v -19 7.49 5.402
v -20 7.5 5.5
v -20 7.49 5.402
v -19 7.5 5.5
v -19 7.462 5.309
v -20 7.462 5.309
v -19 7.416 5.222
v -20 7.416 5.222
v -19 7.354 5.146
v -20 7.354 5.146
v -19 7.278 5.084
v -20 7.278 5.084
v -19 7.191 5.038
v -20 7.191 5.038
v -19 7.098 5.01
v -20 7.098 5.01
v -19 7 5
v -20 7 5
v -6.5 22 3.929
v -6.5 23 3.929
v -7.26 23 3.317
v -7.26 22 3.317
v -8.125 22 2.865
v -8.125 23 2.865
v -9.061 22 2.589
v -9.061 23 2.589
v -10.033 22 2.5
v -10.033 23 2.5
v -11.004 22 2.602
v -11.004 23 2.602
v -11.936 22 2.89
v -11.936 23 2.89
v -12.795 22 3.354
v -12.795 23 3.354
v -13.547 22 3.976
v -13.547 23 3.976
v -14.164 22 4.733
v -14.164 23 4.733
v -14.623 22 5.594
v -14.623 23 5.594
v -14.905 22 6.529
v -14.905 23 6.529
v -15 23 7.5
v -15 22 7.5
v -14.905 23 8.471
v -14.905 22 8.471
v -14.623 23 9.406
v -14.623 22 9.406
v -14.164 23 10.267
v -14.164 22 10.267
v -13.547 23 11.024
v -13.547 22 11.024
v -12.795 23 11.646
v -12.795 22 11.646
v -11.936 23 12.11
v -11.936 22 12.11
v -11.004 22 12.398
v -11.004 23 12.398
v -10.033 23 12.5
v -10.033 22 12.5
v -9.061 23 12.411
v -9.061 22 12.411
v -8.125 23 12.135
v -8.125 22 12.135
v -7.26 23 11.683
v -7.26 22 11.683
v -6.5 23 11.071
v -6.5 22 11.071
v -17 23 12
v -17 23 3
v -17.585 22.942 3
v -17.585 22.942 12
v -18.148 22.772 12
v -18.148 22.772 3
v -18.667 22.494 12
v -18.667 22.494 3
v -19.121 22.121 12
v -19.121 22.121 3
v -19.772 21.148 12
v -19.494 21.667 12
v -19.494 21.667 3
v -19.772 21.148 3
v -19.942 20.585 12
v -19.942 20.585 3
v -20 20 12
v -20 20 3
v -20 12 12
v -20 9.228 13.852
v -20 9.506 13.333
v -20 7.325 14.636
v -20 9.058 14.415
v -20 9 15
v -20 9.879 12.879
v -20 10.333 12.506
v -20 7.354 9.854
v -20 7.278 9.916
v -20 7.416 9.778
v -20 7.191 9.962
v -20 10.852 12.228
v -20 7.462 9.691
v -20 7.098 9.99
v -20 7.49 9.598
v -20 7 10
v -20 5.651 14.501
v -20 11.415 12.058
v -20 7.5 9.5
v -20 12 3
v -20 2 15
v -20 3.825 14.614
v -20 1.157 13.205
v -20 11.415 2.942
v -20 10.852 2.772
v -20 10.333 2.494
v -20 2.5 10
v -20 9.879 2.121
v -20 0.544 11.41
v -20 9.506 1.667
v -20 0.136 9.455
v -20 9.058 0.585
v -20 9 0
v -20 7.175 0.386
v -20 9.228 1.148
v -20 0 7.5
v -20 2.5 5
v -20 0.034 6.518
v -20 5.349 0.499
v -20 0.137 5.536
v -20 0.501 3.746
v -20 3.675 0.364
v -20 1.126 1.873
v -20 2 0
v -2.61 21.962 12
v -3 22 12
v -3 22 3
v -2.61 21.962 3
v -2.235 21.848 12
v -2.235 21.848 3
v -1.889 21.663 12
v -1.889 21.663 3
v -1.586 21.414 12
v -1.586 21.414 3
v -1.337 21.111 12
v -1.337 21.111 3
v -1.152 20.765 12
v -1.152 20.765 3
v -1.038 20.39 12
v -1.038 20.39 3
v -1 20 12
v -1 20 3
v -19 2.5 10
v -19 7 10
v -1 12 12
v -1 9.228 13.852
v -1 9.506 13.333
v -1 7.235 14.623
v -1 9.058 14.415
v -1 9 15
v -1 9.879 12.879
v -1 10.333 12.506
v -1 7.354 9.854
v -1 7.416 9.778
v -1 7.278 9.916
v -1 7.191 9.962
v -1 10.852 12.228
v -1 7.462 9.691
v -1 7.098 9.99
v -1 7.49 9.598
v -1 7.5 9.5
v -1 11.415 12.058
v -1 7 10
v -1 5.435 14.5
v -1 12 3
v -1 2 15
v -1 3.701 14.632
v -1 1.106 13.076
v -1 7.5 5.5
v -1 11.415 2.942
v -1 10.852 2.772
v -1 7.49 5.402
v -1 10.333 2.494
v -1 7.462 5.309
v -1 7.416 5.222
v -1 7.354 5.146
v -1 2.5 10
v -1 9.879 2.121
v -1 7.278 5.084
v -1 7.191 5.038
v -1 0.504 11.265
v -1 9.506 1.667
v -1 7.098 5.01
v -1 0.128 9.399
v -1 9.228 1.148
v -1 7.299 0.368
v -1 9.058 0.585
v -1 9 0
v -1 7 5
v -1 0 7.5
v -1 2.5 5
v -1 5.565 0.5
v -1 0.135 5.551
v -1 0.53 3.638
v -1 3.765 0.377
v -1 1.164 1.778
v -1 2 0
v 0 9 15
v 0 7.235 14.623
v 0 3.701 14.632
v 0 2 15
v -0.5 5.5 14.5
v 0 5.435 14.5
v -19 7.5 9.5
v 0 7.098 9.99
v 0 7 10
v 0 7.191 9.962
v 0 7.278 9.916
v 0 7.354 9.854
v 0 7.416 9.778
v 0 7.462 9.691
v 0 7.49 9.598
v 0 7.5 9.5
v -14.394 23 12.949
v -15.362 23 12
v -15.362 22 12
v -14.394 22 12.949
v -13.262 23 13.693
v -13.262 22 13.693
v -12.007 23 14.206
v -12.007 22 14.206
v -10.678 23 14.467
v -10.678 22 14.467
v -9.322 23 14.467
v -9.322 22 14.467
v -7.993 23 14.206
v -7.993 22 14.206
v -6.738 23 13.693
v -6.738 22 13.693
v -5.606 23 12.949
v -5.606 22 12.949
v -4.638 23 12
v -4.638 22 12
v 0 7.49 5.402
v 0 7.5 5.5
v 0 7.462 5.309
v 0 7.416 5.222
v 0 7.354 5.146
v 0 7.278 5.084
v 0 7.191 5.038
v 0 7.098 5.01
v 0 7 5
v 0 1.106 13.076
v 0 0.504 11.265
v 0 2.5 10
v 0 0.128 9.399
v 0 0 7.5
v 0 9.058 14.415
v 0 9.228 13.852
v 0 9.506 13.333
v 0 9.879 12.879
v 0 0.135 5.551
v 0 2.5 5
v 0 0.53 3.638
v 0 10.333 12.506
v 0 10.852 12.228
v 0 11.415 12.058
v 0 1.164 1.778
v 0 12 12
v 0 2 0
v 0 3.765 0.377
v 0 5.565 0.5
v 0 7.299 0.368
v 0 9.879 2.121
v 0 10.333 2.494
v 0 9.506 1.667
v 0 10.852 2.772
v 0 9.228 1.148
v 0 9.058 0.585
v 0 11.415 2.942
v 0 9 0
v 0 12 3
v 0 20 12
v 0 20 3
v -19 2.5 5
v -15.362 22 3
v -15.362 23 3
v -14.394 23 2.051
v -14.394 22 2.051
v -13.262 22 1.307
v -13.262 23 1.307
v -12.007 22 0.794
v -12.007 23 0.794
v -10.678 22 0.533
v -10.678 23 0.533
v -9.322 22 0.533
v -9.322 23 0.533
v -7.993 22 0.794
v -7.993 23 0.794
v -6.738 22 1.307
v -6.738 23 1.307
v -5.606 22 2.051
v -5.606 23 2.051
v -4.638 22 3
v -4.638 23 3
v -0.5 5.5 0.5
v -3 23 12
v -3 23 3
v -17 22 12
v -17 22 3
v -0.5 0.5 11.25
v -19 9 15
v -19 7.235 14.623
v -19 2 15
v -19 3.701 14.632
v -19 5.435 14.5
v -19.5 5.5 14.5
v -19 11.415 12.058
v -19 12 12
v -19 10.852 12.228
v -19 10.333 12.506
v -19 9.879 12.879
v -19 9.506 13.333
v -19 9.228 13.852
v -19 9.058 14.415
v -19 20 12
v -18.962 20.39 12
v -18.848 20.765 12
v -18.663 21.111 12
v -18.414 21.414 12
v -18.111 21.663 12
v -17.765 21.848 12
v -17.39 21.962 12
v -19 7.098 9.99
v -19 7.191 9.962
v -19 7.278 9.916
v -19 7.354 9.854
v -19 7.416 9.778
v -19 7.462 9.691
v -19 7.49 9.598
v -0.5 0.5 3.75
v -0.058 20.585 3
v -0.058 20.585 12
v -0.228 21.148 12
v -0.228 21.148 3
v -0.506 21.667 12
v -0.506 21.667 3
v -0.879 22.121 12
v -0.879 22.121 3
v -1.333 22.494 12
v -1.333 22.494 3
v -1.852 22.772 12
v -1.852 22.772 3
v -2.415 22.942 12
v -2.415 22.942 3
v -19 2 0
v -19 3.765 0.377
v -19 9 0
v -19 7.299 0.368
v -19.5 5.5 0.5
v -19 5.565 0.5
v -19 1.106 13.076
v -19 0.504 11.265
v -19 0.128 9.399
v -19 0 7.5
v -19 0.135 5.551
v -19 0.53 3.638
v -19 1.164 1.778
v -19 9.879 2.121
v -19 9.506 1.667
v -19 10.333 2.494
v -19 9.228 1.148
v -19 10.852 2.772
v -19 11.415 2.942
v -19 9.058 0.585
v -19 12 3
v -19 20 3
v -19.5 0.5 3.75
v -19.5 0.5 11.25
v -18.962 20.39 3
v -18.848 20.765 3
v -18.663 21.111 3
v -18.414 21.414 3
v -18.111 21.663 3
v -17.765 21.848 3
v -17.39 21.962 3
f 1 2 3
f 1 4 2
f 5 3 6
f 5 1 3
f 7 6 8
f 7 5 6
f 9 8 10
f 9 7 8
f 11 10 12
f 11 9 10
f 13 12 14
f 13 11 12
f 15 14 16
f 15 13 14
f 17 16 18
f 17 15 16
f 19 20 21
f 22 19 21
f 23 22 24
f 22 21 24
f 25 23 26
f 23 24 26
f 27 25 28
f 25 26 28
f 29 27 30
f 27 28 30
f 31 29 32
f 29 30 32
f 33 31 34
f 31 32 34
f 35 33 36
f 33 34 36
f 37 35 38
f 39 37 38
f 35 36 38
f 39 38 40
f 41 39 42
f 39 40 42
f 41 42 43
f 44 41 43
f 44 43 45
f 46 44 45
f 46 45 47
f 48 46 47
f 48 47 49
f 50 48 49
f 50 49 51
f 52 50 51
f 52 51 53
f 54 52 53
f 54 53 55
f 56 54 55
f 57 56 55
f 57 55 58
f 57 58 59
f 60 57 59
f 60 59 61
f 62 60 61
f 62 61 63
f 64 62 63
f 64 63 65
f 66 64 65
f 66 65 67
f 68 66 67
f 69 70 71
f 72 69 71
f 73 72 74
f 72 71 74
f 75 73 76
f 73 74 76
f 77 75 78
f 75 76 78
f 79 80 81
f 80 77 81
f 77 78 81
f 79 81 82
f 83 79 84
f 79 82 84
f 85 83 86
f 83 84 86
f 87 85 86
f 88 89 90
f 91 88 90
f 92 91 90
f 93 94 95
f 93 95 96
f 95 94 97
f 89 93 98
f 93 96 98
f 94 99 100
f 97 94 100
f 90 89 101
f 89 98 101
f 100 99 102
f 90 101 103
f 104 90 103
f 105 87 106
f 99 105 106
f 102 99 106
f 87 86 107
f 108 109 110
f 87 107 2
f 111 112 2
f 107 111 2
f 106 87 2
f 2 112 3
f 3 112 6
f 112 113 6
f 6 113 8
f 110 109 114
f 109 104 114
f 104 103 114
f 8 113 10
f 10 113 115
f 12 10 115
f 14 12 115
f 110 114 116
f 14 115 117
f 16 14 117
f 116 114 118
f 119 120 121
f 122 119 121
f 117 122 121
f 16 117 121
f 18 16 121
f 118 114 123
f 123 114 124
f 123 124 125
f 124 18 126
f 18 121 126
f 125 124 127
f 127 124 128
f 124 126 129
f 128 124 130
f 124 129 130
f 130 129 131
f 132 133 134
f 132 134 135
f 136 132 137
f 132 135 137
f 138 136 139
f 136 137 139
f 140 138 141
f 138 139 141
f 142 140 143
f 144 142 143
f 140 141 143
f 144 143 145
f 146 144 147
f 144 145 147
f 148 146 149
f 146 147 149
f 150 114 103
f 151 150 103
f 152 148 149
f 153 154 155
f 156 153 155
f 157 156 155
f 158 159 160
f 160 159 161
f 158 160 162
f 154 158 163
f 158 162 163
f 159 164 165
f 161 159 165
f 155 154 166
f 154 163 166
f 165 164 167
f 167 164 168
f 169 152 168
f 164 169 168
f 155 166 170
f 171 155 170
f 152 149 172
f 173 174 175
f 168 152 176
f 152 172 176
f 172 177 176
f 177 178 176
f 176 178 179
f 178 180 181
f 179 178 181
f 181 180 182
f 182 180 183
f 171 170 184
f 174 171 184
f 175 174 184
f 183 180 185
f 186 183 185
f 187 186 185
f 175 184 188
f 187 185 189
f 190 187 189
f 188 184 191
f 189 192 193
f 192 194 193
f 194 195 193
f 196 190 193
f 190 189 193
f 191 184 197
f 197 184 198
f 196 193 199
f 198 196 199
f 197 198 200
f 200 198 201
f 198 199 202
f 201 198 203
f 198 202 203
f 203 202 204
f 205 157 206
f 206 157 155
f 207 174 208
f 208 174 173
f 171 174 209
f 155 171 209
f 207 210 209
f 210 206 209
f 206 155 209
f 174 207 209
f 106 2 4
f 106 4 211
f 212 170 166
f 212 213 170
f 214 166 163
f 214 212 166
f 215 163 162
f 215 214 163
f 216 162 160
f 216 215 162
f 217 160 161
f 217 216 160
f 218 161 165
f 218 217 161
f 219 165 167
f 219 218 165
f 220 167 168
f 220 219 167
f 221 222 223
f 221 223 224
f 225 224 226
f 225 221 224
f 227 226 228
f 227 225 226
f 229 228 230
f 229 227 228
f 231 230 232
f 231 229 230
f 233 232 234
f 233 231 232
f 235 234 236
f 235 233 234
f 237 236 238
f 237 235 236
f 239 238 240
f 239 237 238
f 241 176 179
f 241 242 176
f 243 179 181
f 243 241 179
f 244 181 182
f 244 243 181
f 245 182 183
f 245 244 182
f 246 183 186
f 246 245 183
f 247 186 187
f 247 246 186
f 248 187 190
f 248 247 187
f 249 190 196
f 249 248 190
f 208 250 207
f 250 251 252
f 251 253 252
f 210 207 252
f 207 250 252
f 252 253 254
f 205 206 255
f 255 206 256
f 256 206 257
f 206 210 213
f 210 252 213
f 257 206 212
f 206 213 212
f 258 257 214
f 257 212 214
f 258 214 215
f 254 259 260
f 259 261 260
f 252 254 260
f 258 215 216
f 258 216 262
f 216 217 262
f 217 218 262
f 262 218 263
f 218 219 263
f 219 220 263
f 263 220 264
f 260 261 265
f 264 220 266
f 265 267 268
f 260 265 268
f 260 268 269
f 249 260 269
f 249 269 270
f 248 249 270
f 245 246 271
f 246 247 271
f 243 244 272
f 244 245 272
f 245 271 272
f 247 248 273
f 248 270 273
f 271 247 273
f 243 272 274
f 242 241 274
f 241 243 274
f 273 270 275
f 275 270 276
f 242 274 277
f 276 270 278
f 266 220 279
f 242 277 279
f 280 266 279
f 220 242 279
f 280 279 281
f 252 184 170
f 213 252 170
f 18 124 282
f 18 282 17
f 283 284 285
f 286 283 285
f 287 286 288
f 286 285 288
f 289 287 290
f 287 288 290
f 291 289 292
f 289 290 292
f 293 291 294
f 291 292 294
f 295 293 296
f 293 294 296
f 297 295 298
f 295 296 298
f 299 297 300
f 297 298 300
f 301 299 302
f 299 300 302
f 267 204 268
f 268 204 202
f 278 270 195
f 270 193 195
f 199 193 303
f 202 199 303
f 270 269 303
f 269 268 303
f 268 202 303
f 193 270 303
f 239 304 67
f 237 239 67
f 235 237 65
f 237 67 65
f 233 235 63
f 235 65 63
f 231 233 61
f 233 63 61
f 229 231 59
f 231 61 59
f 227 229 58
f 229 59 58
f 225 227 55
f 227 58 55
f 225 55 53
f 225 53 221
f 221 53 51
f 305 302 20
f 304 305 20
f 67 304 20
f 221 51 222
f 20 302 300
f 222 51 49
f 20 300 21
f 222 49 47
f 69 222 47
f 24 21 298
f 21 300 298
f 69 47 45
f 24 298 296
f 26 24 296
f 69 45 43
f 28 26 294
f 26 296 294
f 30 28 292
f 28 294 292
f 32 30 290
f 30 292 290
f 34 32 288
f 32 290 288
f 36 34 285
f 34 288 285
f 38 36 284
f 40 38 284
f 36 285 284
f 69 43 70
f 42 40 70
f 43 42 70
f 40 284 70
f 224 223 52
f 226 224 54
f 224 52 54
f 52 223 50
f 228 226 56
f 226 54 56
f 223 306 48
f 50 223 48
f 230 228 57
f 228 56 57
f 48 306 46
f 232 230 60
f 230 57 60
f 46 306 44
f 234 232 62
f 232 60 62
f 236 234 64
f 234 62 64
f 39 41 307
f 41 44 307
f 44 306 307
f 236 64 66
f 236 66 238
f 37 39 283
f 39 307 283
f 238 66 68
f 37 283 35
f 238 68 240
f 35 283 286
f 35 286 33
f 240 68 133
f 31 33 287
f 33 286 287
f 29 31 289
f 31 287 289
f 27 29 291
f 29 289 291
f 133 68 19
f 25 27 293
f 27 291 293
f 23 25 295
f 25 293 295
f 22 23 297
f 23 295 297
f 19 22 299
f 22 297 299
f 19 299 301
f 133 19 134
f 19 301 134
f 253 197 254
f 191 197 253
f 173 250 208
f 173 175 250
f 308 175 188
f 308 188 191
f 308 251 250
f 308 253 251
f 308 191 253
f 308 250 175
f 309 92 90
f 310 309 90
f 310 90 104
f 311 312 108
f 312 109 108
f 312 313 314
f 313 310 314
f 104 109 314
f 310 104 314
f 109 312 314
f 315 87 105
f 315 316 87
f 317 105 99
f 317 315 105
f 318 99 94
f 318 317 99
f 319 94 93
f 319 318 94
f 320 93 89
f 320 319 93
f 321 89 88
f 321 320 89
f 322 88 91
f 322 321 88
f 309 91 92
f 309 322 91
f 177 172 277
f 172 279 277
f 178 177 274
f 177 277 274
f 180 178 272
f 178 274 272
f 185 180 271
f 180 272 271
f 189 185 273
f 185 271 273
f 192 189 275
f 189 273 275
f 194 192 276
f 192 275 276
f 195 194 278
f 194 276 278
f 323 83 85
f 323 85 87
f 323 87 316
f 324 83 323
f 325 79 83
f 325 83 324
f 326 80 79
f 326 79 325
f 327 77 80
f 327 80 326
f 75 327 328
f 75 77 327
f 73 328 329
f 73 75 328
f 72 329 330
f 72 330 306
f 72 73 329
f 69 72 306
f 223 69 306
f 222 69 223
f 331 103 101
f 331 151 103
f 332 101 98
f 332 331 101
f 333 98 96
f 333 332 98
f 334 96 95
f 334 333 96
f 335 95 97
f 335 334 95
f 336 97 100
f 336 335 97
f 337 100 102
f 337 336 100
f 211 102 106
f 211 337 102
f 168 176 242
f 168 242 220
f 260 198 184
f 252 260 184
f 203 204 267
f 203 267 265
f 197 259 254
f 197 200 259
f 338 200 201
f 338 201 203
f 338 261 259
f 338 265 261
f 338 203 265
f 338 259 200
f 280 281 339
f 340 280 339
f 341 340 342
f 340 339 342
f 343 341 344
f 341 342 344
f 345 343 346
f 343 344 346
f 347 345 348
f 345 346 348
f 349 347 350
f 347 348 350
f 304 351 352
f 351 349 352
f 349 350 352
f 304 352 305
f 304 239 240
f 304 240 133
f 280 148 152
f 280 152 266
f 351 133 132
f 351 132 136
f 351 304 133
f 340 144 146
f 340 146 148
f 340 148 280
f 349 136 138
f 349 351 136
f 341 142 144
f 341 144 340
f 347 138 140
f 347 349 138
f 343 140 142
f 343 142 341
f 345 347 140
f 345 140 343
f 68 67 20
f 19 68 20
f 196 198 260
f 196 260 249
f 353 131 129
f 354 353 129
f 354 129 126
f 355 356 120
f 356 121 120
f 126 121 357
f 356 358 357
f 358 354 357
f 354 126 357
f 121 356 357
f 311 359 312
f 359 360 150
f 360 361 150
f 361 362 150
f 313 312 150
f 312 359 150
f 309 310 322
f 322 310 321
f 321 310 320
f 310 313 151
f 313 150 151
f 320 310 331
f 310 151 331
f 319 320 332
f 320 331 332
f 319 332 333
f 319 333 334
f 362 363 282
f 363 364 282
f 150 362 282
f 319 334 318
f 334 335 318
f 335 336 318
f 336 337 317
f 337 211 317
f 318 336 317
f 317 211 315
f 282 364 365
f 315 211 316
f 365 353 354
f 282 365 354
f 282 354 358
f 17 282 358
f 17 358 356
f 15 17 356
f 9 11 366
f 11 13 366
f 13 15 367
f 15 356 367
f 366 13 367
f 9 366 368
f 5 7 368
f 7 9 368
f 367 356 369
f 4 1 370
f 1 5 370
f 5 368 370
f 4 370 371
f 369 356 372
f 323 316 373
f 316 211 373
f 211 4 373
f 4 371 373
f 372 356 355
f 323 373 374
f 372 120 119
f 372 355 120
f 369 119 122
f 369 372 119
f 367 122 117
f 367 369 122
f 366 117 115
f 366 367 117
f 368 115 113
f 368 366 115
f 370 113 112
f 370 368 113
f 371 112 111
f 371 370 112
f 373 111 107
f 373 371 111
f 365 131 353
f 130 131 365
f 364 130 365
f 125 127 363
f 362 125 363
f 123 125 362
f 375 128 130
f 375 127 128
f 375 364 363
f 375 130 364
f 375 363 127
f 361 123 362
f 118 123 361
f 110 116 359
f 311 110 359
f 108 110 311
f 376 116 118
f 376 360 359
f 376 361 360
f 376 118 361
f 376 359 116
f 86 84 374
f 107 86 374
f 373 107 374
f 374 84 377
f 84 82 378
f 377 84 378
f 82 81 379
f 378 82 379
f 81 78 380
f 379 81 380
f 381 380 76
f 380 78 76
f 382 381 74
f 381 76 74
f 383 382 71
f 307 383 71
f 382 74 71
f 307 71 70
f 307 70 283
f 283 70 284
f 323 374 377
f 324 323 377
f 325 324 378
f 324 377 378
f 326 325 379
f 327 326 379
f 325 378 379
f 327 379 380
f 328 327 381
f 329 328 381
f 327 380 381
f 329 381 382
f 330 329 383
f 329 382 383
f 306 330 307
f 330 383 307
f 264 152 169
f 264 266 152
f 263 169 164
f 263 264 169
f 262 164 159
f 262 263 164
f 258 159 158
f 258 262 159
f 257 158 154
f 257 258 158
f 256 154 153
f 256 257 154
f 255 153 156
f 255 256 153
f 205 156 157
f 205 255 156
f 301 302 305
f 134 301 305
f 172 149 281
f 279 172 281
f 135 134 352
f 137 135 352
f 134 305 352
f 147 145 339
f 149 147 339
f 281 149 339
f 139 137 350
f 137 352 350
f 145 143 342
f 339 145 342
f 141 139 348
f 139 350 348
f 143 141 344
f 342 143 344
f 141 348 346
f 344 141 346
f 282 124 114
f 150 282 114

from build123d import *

# Parameters (mm, degrees)
BOSS_EXTRUDE1_DEPTH = 15
CUT_EXTRUDE2_DEPTH  = 34.970575503
CUT_EXTRUDE3_DEPTH  = 14
CUT_EXTRUDE4_DEPTH  = 34.970575503
CUT_EXTRUDE5_DEPTH  = 34.970575606
FILLET1_R           = 3
FILLET2_R           = 3
SKETCH7_W           = 5
SKETCH7_H           = 5
CUT_EXTRUDE6_DEPTH  = 34.970575606
FILLET3_R           = 0.5


with BuildPart() as part:
    # Sketch1 → Boss-Extrude1 (new body)
    with BuildSketch(Plane.XY):
        with BuildLine():
            Line((-19, 0), (-19, 20))
            ThreePointArc((-19, 20), (-18.414213562, 21.414213562), (-17, 22))
            Line((-17, 22), (-3, 22))
            ThreePointArc((-3, 22), (-1.585786438, 21.414213562), (-1, 20))
            Line((-1, 20), (-1, 0))
            Line((-1, 0), (0, 0))
            Line((0, 0), (0, 20))
            ThreePointArc((0, 20), (-0.878679656, 22.121320344), (-3, 23))
            Line((-3, 23), (-17, 23))
            ThreePointArc((-17, 23), (-19.121320344, 22.121320344), (-20, 20))
            Line((-20, 20), (-20, 0))
            Line((-20, 0), (-19, 0))
        make_face()
    extrude(amount=BOSS_EXTRUDE1_DEPTH)

    # Sketch2 → Cut-Extrude2 (cut, through all)
    with BuildSketch(Plane(origin=(0, 23, 0), x_dir=(1, 0, 0), z_dir=(0, 1, 0))):
        with BuildLine():
            Line((-6.5, -11.070714214), (-6.5, -3.929285786))
            ThreePointArc((-6.5, -3.929285786), (-15, -7.5), (-6.5, -11.070714214))
        make_face()
    extrude(amount=-CUT_EXTRUDE2_DEPTH, mode=Mode.SUBTRACT)

    # Sketch4 → Cut-Extrude3 (cut)
    with BuildSketch(Plane(origin=(0, 23, 0), x_dir=(1, 0, 0), z_dir=(0, 1, 0))):
        with BuildLine():
            Line((-4.638097353, -12), (0, -12))
            Line((0, -12), (0, -15))
            Line((0, -15), (-20, -15))
            Line((-20, -15), (-20, -12))
            Line((-20, -12), (-15.361902647, -12))
            ThreePointArc((-15.361902647, -12), (-10, -14.5), (-4.638097353, -12))
        make_face()
        with BuildLine():
            Line((-4.638097353, -3), (0, -3))
            Line((0, -3), (0, 0))
            Line((0, 0), (-20, 0))
            Line((-20, 0), (-20, -3))
            Line((-20, -3), (-15.361902647, -3))
            ThreePointArc((-15.361902647, -3), (-10, -0.5), (-4.638097353, -3))
        make_face()
    extrude(amount=-CUT_EXTRUDE3_DEPTH, mode=Mode.SUBTRACT)

    # Sketch5 → Cut-Extrude4 (cut, through all)
    with BuildSketch(Plane.ZY.offset(20)):
        with BuildLine():
            Line((0, 2), (0, 0))
            Line((0, 0), (7.5, 0))
            add(Edge.make_bspline(
                [(0, 2), (3.75, 0), (7.5, 0)],
                knots=[0, 0, 0, 0.5, 0.5, 0.5], degree=2))
        make_face()
        with BuildLine():
            add(Edge.make_bspline(
                [(7.5, 0), (11.25, 0), (15, 2)],
                knots=[0.5, 0.5, 0.5, 1, 1, 1], degree=2))
            Line((7.5, 0), (15, 0))
            Line((15, 0), (15, 2))
        make_face()
    extrude(amount=-CUT_EXTRUDE4_DEPTH, mode=Mode.SUBTRACT)

    # Sketch6 → Cut-Extrude5 (cut, through all)
    with BuildSketch(Plane.ZY.offset(20)):
        with BuildLine():
            Line((0, 9), (0, 5.5))
            Line((0, 5.5), (0.5, 5.5))
            add(Edge.make_bspline(
                [(0, 9), (0.5, 7.25), (0.5, 5.5)],
                knots=[0, 0, 0, 0.5, 0.5, 0.5], degree=2))
        make_face()
        with BuildLine():
            Line((0.5, 5.5), (0, 5.5))
            Line((0, 5.5), (0, 2))
            add(Edge.make_bspline(
                [(0.5, 5.5), (0.5, 3.75), (0, 2)],
                knots=[0.5, 0.5, 0.5, 1, 1, 1], degree=2))
        make_face()
        with BuildLine():
            Line((15, 9), (15, 2))
            add(Edge.make_bspline(
                [(15, 9), (14, 5.5), (15, 2)],
                knots=[0, 0, 0, 1, 1, 1], degree=2))
        make_face()
    extrude(amount=-CUT_EXTRUDE5_DEPTH, mode=Mode.SUBTRACT)

    # Fillet1
    fillet1_edges = [part.edges().sort_by_distance(p)[0] for p in [
        (-19.5, 9, 3),
    ]]
    fillet(fillet1_edges, radius=FILLET1_R - 0.0001)  # a hair under: the kernel refuses the full size

    # Fillet2
    fillet2_edges = [part.edges().sort_by_distance(p)[0] for p in [
        (-0.5, 9, 3),
        (-0.5, 9, 12),
        (-19.5, 9, 12),
    ]]
    fillet(fillet2_edges, radius=FILLET2_R - 0.0001)  # a hair under: the kernel refuses the full size

    # Sketch7 → Cut-Extrude6 (cut, through all)
    with BuildSketch(Plane.ZY.offset(20)):
        with Locations((7.5, 5)):
            Rectangle(SKETCH7_W, SKETCH7_H)
    extrude(amount=-CUT_EXTRUDE6_DEPTH, mode=Mode.SUBTRACT)

    # Fillet3
    fillet3_edges = [part.edges().sort_by_distance(p)[0] for p in [
        (-0.5, 7.5, 5),
        (-19.5, 7.5, 5),
        (-0.5, 7.5, 10),
        (-19.5, 7.5, 10),
    ]]
    fillet(fillet3_edges, radius=FILLET3_R)


solid = part.part
